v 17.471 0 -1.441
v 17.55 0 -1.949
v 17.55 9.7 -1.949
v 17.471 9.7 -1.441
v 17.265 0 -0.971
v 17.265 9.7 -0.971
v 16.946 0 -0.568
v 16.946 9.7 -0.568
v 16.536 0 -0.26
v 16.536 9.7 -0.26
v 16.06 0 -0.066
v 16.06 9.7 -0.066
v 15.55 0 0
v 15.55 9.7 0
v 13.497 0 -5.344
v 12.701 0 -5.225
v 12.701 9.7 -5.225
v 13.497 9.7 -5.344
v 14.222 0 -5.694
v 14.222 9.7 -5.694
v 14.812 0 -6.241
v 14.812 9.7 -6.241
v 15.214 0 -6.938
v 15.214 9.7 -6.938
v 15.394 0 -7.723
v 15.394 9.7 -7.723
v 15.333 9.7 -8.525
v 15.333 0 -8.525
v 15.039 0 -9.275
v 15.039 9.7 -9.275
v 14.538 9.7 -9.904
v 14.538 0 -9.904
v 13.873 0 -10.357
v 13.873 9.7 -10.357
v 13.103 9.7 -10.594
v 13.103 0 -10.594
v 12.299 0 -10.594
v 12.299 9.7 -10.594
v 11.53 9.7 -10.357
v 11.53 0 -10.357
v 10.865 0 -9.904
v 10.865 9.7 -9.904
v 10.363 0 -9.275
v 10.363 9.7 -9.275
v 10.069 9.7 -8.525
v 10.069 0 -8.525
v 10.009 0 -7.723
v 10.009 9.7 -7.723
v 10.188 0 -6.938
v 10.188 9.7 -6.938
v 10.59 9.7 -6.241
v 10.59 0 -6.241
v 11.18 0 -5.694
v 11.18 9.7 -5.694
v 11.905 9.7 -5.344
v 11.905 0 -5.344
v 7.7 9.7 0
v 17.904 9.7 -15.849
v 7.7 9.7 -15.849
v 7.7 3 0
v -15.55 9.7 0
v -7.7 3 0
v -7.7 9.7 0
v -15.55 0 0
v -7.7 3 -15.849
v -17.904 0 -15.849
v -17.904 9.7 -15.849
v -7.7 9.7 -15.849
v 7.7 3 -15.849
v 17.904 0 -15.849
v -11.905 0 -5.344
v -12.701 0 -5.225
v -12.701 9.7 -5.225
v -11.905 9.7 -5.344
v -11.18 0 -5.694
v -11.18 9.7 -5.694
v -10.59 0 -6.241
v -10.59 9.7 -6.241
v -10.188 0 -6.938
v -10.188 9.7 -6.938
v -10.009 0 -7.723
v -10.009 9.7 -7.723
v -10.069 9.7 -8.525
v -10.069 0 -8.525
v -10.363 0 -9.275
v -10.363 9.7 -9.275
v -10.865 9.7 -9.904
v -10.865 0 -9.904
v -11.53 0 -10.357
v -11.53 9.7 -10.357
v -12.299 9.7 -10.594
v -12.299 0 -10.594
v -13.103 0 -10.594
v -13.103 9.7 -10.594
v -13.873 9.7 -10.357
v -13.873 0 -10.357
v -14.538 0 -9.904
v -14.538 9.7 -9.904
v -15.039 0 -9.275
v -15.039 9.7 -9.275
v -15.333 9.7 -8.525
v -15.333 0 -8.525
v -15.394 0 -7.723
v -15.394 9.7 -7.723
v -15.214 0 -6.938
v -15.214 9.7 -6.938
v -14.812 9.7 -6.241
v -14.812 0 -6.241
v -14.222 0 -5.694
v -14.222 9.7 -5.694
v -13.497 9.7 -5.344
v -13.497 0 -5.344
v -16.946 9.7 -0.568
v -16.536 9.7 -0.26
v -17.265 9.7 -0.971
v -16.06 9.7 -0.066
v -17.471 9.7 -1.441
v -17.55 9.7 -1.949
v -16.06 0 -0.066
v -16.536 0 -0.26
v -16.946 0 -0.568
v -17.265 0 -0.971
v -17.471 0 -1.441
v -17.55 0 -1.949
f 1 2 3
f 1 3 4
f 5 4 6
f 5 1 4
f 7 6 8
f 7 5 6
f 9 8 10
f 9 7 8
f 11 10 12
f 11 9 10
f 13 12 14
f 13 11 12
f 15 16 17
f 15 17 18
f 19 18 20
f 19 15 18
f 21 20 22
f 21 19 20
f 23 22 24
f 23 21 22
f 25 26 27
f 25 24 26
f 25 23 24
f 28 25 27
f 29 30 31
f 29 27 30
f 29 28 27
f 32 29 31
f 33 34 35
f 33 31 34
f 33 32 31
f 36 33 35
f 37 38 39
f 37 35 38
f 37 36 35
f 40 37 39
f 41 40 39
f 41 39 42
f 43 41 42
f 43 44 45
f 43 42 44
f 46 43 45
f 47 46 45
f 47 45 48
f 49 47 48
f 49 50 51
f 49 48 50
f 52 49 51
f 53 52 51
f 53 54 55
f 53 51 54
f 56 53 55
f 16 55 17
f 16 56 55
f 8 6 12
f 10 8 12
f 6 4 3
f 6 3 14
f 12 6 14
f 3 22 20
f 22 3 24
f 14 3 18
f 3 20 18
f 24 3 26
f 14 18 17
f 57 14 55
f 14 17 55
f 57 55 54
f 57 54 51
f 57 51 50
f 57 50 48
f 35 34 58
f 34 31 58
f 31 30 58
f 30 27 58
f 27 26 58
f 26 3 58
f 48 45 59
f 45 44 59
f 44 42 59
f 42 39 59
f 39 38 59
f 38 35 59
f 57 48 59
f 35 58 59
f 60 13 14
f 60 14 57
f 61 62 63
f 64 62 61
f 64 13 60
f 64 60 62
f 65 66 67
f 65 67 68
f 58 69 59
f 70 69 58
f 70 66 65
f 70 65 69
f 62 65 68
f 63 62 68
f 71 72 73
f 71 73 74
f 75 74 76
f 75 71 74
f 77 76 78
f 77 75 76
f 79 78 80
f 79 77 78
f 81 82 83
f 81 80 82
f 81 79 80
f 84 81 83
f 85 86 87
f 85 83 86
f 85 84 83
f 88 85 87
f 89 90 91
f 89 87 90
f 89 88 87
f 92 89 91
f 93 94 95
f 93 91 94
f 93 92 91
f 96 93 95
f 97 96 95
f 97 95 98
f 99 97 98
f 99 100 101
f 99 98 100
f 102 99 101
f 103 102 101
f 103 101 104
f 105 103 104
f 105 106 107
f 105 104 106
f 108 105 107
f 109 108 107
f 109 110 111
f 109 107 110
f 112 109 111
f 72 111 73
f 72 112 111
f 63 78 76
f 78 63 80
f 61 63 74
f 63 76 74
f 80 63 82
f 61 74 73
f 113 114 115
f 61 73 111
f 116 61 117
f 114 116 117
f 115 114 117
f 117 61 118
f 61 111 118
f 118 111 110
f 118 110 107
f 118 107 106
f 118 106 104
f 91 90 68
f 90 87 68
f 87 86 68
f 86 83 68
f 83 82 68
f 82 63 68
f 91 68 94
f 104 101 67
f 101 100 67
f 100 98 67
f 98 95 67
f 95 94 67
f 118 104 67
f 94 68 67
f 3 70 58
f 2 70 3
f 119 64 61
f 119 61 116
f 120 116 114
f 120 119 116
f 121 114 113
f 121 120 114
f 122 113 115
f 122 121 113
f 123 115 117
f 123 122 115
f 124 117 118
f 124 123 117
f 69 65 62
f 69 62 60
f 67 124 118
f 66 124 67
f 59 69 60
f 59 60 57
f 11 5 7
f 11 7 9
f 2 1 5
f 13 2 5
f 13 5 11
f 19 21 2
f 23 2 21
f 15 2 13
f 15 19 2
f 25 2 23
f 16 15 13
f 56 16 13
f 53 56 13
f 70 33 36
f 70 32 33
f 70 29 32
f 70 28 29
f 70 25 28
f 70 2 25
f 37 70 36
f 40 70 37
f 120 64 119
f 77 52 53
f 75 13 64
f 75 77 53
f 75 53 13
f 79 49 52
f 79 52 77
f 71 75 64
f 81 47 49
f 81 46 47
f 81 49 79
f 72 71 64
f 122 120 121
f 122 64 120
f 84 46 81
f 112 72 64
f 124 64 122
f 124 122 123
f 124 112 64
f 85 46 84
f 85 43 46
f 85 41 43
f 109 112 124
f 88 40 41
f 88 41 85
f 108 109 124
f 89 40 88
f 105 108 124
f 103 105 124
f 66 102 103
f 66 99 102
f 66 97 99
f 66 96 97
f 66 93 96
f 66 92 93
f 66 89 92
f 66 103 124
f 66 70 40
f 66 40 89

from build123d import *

# Parameters (mm, degrees)
BOSS_EXTRUDE2_DEPTH     = 9.7
CUT_EXTRUDE1_DEPTH      = 26.804010416
CUT_EXTRUDE1_DEPTH_BACK = 26.804010416
SKETCH4_W               = 15.4
SKETCH4_H               = 15.4
CUT_EXTRUDE2_DEPTH      = 26.804010416
CUT_EXTRUDE2_DEPTH_BACK = 26.804010416
SKETCH5_R               = 2.7


with BuildPart() as part:
    # Sketch3 → Boss-Extrude2 (new body)
    with BuildSketch(Plane(origin=(0, 0, 0), x_dir=(1, 0, 0), z_dir=(0, 1, 0))):
        with BuildLine():
            Line((-17.904307086, 15.849061213), (17.904307086, 15.849061213))
            Line((17.904307086, 15.849061213), (17.549718608, 1.948996904))
            ThreePointArc((17.549718608, 1.948996904), (16.946433835, 0.56786764), (15.550369043, 0))
            Line((15.550369043, 0), (-15.550369043, 0))
            ThreePointArc((-15.550369043, 0), (-16.946433835, 0.56786764), (-17.549718608, 1.948996904))
            Line((-17.549718608, 1.948996904), (-17.904307086, 15.849061213))
        make_face()
    extrude(amount=BOSS_EXTRUDE2_DEPTH)

    # Sketch4 → Cut-Extrude1 (cut, two sides: drawn at the far end of the back side and taken through both)
    with BuildSketch(Plane.XY.offset(-CUT_EXTRUDE1_DEPTH_BACK)):
        with Locations((0, 10.7)):
            Rectangle(SKETCH4_W, SKETCH4_H)
    extrude(amount=CUT_EXTRUDE1_DEPTH + CUT_EXTRUDE1_DEPTH_BACK, mode=Mode.SUBTRACT)

    # Sketch5 → Cut-Extrude2 (cut, two sides: drawn at the far end of the back side and taken through both)
    with BuildSketch(Plane(origin=(0, 9.7, 0), x_dir=(1, 0, 0), z_dir=(0, 1, 0)).offset(-CUT_EXTRUDE2_DEPTH_BACK)):
        with Locations(Location((-12.701076771, 7.924530607, 0), (0, 0, 270))):
            Circle(SKETCH5_R)
        with Locations(Location((12.701076771, 7.924530607, 0), (0, 0, 270))):
            Circle(SKETCH5_R)
    extrude(amount=CUT_EXTRUDE2_DEPTH + CUT_EXTRUDE2_DEPTH_BACK, mode=Mode.SUBTRACT)


solid = part.part
